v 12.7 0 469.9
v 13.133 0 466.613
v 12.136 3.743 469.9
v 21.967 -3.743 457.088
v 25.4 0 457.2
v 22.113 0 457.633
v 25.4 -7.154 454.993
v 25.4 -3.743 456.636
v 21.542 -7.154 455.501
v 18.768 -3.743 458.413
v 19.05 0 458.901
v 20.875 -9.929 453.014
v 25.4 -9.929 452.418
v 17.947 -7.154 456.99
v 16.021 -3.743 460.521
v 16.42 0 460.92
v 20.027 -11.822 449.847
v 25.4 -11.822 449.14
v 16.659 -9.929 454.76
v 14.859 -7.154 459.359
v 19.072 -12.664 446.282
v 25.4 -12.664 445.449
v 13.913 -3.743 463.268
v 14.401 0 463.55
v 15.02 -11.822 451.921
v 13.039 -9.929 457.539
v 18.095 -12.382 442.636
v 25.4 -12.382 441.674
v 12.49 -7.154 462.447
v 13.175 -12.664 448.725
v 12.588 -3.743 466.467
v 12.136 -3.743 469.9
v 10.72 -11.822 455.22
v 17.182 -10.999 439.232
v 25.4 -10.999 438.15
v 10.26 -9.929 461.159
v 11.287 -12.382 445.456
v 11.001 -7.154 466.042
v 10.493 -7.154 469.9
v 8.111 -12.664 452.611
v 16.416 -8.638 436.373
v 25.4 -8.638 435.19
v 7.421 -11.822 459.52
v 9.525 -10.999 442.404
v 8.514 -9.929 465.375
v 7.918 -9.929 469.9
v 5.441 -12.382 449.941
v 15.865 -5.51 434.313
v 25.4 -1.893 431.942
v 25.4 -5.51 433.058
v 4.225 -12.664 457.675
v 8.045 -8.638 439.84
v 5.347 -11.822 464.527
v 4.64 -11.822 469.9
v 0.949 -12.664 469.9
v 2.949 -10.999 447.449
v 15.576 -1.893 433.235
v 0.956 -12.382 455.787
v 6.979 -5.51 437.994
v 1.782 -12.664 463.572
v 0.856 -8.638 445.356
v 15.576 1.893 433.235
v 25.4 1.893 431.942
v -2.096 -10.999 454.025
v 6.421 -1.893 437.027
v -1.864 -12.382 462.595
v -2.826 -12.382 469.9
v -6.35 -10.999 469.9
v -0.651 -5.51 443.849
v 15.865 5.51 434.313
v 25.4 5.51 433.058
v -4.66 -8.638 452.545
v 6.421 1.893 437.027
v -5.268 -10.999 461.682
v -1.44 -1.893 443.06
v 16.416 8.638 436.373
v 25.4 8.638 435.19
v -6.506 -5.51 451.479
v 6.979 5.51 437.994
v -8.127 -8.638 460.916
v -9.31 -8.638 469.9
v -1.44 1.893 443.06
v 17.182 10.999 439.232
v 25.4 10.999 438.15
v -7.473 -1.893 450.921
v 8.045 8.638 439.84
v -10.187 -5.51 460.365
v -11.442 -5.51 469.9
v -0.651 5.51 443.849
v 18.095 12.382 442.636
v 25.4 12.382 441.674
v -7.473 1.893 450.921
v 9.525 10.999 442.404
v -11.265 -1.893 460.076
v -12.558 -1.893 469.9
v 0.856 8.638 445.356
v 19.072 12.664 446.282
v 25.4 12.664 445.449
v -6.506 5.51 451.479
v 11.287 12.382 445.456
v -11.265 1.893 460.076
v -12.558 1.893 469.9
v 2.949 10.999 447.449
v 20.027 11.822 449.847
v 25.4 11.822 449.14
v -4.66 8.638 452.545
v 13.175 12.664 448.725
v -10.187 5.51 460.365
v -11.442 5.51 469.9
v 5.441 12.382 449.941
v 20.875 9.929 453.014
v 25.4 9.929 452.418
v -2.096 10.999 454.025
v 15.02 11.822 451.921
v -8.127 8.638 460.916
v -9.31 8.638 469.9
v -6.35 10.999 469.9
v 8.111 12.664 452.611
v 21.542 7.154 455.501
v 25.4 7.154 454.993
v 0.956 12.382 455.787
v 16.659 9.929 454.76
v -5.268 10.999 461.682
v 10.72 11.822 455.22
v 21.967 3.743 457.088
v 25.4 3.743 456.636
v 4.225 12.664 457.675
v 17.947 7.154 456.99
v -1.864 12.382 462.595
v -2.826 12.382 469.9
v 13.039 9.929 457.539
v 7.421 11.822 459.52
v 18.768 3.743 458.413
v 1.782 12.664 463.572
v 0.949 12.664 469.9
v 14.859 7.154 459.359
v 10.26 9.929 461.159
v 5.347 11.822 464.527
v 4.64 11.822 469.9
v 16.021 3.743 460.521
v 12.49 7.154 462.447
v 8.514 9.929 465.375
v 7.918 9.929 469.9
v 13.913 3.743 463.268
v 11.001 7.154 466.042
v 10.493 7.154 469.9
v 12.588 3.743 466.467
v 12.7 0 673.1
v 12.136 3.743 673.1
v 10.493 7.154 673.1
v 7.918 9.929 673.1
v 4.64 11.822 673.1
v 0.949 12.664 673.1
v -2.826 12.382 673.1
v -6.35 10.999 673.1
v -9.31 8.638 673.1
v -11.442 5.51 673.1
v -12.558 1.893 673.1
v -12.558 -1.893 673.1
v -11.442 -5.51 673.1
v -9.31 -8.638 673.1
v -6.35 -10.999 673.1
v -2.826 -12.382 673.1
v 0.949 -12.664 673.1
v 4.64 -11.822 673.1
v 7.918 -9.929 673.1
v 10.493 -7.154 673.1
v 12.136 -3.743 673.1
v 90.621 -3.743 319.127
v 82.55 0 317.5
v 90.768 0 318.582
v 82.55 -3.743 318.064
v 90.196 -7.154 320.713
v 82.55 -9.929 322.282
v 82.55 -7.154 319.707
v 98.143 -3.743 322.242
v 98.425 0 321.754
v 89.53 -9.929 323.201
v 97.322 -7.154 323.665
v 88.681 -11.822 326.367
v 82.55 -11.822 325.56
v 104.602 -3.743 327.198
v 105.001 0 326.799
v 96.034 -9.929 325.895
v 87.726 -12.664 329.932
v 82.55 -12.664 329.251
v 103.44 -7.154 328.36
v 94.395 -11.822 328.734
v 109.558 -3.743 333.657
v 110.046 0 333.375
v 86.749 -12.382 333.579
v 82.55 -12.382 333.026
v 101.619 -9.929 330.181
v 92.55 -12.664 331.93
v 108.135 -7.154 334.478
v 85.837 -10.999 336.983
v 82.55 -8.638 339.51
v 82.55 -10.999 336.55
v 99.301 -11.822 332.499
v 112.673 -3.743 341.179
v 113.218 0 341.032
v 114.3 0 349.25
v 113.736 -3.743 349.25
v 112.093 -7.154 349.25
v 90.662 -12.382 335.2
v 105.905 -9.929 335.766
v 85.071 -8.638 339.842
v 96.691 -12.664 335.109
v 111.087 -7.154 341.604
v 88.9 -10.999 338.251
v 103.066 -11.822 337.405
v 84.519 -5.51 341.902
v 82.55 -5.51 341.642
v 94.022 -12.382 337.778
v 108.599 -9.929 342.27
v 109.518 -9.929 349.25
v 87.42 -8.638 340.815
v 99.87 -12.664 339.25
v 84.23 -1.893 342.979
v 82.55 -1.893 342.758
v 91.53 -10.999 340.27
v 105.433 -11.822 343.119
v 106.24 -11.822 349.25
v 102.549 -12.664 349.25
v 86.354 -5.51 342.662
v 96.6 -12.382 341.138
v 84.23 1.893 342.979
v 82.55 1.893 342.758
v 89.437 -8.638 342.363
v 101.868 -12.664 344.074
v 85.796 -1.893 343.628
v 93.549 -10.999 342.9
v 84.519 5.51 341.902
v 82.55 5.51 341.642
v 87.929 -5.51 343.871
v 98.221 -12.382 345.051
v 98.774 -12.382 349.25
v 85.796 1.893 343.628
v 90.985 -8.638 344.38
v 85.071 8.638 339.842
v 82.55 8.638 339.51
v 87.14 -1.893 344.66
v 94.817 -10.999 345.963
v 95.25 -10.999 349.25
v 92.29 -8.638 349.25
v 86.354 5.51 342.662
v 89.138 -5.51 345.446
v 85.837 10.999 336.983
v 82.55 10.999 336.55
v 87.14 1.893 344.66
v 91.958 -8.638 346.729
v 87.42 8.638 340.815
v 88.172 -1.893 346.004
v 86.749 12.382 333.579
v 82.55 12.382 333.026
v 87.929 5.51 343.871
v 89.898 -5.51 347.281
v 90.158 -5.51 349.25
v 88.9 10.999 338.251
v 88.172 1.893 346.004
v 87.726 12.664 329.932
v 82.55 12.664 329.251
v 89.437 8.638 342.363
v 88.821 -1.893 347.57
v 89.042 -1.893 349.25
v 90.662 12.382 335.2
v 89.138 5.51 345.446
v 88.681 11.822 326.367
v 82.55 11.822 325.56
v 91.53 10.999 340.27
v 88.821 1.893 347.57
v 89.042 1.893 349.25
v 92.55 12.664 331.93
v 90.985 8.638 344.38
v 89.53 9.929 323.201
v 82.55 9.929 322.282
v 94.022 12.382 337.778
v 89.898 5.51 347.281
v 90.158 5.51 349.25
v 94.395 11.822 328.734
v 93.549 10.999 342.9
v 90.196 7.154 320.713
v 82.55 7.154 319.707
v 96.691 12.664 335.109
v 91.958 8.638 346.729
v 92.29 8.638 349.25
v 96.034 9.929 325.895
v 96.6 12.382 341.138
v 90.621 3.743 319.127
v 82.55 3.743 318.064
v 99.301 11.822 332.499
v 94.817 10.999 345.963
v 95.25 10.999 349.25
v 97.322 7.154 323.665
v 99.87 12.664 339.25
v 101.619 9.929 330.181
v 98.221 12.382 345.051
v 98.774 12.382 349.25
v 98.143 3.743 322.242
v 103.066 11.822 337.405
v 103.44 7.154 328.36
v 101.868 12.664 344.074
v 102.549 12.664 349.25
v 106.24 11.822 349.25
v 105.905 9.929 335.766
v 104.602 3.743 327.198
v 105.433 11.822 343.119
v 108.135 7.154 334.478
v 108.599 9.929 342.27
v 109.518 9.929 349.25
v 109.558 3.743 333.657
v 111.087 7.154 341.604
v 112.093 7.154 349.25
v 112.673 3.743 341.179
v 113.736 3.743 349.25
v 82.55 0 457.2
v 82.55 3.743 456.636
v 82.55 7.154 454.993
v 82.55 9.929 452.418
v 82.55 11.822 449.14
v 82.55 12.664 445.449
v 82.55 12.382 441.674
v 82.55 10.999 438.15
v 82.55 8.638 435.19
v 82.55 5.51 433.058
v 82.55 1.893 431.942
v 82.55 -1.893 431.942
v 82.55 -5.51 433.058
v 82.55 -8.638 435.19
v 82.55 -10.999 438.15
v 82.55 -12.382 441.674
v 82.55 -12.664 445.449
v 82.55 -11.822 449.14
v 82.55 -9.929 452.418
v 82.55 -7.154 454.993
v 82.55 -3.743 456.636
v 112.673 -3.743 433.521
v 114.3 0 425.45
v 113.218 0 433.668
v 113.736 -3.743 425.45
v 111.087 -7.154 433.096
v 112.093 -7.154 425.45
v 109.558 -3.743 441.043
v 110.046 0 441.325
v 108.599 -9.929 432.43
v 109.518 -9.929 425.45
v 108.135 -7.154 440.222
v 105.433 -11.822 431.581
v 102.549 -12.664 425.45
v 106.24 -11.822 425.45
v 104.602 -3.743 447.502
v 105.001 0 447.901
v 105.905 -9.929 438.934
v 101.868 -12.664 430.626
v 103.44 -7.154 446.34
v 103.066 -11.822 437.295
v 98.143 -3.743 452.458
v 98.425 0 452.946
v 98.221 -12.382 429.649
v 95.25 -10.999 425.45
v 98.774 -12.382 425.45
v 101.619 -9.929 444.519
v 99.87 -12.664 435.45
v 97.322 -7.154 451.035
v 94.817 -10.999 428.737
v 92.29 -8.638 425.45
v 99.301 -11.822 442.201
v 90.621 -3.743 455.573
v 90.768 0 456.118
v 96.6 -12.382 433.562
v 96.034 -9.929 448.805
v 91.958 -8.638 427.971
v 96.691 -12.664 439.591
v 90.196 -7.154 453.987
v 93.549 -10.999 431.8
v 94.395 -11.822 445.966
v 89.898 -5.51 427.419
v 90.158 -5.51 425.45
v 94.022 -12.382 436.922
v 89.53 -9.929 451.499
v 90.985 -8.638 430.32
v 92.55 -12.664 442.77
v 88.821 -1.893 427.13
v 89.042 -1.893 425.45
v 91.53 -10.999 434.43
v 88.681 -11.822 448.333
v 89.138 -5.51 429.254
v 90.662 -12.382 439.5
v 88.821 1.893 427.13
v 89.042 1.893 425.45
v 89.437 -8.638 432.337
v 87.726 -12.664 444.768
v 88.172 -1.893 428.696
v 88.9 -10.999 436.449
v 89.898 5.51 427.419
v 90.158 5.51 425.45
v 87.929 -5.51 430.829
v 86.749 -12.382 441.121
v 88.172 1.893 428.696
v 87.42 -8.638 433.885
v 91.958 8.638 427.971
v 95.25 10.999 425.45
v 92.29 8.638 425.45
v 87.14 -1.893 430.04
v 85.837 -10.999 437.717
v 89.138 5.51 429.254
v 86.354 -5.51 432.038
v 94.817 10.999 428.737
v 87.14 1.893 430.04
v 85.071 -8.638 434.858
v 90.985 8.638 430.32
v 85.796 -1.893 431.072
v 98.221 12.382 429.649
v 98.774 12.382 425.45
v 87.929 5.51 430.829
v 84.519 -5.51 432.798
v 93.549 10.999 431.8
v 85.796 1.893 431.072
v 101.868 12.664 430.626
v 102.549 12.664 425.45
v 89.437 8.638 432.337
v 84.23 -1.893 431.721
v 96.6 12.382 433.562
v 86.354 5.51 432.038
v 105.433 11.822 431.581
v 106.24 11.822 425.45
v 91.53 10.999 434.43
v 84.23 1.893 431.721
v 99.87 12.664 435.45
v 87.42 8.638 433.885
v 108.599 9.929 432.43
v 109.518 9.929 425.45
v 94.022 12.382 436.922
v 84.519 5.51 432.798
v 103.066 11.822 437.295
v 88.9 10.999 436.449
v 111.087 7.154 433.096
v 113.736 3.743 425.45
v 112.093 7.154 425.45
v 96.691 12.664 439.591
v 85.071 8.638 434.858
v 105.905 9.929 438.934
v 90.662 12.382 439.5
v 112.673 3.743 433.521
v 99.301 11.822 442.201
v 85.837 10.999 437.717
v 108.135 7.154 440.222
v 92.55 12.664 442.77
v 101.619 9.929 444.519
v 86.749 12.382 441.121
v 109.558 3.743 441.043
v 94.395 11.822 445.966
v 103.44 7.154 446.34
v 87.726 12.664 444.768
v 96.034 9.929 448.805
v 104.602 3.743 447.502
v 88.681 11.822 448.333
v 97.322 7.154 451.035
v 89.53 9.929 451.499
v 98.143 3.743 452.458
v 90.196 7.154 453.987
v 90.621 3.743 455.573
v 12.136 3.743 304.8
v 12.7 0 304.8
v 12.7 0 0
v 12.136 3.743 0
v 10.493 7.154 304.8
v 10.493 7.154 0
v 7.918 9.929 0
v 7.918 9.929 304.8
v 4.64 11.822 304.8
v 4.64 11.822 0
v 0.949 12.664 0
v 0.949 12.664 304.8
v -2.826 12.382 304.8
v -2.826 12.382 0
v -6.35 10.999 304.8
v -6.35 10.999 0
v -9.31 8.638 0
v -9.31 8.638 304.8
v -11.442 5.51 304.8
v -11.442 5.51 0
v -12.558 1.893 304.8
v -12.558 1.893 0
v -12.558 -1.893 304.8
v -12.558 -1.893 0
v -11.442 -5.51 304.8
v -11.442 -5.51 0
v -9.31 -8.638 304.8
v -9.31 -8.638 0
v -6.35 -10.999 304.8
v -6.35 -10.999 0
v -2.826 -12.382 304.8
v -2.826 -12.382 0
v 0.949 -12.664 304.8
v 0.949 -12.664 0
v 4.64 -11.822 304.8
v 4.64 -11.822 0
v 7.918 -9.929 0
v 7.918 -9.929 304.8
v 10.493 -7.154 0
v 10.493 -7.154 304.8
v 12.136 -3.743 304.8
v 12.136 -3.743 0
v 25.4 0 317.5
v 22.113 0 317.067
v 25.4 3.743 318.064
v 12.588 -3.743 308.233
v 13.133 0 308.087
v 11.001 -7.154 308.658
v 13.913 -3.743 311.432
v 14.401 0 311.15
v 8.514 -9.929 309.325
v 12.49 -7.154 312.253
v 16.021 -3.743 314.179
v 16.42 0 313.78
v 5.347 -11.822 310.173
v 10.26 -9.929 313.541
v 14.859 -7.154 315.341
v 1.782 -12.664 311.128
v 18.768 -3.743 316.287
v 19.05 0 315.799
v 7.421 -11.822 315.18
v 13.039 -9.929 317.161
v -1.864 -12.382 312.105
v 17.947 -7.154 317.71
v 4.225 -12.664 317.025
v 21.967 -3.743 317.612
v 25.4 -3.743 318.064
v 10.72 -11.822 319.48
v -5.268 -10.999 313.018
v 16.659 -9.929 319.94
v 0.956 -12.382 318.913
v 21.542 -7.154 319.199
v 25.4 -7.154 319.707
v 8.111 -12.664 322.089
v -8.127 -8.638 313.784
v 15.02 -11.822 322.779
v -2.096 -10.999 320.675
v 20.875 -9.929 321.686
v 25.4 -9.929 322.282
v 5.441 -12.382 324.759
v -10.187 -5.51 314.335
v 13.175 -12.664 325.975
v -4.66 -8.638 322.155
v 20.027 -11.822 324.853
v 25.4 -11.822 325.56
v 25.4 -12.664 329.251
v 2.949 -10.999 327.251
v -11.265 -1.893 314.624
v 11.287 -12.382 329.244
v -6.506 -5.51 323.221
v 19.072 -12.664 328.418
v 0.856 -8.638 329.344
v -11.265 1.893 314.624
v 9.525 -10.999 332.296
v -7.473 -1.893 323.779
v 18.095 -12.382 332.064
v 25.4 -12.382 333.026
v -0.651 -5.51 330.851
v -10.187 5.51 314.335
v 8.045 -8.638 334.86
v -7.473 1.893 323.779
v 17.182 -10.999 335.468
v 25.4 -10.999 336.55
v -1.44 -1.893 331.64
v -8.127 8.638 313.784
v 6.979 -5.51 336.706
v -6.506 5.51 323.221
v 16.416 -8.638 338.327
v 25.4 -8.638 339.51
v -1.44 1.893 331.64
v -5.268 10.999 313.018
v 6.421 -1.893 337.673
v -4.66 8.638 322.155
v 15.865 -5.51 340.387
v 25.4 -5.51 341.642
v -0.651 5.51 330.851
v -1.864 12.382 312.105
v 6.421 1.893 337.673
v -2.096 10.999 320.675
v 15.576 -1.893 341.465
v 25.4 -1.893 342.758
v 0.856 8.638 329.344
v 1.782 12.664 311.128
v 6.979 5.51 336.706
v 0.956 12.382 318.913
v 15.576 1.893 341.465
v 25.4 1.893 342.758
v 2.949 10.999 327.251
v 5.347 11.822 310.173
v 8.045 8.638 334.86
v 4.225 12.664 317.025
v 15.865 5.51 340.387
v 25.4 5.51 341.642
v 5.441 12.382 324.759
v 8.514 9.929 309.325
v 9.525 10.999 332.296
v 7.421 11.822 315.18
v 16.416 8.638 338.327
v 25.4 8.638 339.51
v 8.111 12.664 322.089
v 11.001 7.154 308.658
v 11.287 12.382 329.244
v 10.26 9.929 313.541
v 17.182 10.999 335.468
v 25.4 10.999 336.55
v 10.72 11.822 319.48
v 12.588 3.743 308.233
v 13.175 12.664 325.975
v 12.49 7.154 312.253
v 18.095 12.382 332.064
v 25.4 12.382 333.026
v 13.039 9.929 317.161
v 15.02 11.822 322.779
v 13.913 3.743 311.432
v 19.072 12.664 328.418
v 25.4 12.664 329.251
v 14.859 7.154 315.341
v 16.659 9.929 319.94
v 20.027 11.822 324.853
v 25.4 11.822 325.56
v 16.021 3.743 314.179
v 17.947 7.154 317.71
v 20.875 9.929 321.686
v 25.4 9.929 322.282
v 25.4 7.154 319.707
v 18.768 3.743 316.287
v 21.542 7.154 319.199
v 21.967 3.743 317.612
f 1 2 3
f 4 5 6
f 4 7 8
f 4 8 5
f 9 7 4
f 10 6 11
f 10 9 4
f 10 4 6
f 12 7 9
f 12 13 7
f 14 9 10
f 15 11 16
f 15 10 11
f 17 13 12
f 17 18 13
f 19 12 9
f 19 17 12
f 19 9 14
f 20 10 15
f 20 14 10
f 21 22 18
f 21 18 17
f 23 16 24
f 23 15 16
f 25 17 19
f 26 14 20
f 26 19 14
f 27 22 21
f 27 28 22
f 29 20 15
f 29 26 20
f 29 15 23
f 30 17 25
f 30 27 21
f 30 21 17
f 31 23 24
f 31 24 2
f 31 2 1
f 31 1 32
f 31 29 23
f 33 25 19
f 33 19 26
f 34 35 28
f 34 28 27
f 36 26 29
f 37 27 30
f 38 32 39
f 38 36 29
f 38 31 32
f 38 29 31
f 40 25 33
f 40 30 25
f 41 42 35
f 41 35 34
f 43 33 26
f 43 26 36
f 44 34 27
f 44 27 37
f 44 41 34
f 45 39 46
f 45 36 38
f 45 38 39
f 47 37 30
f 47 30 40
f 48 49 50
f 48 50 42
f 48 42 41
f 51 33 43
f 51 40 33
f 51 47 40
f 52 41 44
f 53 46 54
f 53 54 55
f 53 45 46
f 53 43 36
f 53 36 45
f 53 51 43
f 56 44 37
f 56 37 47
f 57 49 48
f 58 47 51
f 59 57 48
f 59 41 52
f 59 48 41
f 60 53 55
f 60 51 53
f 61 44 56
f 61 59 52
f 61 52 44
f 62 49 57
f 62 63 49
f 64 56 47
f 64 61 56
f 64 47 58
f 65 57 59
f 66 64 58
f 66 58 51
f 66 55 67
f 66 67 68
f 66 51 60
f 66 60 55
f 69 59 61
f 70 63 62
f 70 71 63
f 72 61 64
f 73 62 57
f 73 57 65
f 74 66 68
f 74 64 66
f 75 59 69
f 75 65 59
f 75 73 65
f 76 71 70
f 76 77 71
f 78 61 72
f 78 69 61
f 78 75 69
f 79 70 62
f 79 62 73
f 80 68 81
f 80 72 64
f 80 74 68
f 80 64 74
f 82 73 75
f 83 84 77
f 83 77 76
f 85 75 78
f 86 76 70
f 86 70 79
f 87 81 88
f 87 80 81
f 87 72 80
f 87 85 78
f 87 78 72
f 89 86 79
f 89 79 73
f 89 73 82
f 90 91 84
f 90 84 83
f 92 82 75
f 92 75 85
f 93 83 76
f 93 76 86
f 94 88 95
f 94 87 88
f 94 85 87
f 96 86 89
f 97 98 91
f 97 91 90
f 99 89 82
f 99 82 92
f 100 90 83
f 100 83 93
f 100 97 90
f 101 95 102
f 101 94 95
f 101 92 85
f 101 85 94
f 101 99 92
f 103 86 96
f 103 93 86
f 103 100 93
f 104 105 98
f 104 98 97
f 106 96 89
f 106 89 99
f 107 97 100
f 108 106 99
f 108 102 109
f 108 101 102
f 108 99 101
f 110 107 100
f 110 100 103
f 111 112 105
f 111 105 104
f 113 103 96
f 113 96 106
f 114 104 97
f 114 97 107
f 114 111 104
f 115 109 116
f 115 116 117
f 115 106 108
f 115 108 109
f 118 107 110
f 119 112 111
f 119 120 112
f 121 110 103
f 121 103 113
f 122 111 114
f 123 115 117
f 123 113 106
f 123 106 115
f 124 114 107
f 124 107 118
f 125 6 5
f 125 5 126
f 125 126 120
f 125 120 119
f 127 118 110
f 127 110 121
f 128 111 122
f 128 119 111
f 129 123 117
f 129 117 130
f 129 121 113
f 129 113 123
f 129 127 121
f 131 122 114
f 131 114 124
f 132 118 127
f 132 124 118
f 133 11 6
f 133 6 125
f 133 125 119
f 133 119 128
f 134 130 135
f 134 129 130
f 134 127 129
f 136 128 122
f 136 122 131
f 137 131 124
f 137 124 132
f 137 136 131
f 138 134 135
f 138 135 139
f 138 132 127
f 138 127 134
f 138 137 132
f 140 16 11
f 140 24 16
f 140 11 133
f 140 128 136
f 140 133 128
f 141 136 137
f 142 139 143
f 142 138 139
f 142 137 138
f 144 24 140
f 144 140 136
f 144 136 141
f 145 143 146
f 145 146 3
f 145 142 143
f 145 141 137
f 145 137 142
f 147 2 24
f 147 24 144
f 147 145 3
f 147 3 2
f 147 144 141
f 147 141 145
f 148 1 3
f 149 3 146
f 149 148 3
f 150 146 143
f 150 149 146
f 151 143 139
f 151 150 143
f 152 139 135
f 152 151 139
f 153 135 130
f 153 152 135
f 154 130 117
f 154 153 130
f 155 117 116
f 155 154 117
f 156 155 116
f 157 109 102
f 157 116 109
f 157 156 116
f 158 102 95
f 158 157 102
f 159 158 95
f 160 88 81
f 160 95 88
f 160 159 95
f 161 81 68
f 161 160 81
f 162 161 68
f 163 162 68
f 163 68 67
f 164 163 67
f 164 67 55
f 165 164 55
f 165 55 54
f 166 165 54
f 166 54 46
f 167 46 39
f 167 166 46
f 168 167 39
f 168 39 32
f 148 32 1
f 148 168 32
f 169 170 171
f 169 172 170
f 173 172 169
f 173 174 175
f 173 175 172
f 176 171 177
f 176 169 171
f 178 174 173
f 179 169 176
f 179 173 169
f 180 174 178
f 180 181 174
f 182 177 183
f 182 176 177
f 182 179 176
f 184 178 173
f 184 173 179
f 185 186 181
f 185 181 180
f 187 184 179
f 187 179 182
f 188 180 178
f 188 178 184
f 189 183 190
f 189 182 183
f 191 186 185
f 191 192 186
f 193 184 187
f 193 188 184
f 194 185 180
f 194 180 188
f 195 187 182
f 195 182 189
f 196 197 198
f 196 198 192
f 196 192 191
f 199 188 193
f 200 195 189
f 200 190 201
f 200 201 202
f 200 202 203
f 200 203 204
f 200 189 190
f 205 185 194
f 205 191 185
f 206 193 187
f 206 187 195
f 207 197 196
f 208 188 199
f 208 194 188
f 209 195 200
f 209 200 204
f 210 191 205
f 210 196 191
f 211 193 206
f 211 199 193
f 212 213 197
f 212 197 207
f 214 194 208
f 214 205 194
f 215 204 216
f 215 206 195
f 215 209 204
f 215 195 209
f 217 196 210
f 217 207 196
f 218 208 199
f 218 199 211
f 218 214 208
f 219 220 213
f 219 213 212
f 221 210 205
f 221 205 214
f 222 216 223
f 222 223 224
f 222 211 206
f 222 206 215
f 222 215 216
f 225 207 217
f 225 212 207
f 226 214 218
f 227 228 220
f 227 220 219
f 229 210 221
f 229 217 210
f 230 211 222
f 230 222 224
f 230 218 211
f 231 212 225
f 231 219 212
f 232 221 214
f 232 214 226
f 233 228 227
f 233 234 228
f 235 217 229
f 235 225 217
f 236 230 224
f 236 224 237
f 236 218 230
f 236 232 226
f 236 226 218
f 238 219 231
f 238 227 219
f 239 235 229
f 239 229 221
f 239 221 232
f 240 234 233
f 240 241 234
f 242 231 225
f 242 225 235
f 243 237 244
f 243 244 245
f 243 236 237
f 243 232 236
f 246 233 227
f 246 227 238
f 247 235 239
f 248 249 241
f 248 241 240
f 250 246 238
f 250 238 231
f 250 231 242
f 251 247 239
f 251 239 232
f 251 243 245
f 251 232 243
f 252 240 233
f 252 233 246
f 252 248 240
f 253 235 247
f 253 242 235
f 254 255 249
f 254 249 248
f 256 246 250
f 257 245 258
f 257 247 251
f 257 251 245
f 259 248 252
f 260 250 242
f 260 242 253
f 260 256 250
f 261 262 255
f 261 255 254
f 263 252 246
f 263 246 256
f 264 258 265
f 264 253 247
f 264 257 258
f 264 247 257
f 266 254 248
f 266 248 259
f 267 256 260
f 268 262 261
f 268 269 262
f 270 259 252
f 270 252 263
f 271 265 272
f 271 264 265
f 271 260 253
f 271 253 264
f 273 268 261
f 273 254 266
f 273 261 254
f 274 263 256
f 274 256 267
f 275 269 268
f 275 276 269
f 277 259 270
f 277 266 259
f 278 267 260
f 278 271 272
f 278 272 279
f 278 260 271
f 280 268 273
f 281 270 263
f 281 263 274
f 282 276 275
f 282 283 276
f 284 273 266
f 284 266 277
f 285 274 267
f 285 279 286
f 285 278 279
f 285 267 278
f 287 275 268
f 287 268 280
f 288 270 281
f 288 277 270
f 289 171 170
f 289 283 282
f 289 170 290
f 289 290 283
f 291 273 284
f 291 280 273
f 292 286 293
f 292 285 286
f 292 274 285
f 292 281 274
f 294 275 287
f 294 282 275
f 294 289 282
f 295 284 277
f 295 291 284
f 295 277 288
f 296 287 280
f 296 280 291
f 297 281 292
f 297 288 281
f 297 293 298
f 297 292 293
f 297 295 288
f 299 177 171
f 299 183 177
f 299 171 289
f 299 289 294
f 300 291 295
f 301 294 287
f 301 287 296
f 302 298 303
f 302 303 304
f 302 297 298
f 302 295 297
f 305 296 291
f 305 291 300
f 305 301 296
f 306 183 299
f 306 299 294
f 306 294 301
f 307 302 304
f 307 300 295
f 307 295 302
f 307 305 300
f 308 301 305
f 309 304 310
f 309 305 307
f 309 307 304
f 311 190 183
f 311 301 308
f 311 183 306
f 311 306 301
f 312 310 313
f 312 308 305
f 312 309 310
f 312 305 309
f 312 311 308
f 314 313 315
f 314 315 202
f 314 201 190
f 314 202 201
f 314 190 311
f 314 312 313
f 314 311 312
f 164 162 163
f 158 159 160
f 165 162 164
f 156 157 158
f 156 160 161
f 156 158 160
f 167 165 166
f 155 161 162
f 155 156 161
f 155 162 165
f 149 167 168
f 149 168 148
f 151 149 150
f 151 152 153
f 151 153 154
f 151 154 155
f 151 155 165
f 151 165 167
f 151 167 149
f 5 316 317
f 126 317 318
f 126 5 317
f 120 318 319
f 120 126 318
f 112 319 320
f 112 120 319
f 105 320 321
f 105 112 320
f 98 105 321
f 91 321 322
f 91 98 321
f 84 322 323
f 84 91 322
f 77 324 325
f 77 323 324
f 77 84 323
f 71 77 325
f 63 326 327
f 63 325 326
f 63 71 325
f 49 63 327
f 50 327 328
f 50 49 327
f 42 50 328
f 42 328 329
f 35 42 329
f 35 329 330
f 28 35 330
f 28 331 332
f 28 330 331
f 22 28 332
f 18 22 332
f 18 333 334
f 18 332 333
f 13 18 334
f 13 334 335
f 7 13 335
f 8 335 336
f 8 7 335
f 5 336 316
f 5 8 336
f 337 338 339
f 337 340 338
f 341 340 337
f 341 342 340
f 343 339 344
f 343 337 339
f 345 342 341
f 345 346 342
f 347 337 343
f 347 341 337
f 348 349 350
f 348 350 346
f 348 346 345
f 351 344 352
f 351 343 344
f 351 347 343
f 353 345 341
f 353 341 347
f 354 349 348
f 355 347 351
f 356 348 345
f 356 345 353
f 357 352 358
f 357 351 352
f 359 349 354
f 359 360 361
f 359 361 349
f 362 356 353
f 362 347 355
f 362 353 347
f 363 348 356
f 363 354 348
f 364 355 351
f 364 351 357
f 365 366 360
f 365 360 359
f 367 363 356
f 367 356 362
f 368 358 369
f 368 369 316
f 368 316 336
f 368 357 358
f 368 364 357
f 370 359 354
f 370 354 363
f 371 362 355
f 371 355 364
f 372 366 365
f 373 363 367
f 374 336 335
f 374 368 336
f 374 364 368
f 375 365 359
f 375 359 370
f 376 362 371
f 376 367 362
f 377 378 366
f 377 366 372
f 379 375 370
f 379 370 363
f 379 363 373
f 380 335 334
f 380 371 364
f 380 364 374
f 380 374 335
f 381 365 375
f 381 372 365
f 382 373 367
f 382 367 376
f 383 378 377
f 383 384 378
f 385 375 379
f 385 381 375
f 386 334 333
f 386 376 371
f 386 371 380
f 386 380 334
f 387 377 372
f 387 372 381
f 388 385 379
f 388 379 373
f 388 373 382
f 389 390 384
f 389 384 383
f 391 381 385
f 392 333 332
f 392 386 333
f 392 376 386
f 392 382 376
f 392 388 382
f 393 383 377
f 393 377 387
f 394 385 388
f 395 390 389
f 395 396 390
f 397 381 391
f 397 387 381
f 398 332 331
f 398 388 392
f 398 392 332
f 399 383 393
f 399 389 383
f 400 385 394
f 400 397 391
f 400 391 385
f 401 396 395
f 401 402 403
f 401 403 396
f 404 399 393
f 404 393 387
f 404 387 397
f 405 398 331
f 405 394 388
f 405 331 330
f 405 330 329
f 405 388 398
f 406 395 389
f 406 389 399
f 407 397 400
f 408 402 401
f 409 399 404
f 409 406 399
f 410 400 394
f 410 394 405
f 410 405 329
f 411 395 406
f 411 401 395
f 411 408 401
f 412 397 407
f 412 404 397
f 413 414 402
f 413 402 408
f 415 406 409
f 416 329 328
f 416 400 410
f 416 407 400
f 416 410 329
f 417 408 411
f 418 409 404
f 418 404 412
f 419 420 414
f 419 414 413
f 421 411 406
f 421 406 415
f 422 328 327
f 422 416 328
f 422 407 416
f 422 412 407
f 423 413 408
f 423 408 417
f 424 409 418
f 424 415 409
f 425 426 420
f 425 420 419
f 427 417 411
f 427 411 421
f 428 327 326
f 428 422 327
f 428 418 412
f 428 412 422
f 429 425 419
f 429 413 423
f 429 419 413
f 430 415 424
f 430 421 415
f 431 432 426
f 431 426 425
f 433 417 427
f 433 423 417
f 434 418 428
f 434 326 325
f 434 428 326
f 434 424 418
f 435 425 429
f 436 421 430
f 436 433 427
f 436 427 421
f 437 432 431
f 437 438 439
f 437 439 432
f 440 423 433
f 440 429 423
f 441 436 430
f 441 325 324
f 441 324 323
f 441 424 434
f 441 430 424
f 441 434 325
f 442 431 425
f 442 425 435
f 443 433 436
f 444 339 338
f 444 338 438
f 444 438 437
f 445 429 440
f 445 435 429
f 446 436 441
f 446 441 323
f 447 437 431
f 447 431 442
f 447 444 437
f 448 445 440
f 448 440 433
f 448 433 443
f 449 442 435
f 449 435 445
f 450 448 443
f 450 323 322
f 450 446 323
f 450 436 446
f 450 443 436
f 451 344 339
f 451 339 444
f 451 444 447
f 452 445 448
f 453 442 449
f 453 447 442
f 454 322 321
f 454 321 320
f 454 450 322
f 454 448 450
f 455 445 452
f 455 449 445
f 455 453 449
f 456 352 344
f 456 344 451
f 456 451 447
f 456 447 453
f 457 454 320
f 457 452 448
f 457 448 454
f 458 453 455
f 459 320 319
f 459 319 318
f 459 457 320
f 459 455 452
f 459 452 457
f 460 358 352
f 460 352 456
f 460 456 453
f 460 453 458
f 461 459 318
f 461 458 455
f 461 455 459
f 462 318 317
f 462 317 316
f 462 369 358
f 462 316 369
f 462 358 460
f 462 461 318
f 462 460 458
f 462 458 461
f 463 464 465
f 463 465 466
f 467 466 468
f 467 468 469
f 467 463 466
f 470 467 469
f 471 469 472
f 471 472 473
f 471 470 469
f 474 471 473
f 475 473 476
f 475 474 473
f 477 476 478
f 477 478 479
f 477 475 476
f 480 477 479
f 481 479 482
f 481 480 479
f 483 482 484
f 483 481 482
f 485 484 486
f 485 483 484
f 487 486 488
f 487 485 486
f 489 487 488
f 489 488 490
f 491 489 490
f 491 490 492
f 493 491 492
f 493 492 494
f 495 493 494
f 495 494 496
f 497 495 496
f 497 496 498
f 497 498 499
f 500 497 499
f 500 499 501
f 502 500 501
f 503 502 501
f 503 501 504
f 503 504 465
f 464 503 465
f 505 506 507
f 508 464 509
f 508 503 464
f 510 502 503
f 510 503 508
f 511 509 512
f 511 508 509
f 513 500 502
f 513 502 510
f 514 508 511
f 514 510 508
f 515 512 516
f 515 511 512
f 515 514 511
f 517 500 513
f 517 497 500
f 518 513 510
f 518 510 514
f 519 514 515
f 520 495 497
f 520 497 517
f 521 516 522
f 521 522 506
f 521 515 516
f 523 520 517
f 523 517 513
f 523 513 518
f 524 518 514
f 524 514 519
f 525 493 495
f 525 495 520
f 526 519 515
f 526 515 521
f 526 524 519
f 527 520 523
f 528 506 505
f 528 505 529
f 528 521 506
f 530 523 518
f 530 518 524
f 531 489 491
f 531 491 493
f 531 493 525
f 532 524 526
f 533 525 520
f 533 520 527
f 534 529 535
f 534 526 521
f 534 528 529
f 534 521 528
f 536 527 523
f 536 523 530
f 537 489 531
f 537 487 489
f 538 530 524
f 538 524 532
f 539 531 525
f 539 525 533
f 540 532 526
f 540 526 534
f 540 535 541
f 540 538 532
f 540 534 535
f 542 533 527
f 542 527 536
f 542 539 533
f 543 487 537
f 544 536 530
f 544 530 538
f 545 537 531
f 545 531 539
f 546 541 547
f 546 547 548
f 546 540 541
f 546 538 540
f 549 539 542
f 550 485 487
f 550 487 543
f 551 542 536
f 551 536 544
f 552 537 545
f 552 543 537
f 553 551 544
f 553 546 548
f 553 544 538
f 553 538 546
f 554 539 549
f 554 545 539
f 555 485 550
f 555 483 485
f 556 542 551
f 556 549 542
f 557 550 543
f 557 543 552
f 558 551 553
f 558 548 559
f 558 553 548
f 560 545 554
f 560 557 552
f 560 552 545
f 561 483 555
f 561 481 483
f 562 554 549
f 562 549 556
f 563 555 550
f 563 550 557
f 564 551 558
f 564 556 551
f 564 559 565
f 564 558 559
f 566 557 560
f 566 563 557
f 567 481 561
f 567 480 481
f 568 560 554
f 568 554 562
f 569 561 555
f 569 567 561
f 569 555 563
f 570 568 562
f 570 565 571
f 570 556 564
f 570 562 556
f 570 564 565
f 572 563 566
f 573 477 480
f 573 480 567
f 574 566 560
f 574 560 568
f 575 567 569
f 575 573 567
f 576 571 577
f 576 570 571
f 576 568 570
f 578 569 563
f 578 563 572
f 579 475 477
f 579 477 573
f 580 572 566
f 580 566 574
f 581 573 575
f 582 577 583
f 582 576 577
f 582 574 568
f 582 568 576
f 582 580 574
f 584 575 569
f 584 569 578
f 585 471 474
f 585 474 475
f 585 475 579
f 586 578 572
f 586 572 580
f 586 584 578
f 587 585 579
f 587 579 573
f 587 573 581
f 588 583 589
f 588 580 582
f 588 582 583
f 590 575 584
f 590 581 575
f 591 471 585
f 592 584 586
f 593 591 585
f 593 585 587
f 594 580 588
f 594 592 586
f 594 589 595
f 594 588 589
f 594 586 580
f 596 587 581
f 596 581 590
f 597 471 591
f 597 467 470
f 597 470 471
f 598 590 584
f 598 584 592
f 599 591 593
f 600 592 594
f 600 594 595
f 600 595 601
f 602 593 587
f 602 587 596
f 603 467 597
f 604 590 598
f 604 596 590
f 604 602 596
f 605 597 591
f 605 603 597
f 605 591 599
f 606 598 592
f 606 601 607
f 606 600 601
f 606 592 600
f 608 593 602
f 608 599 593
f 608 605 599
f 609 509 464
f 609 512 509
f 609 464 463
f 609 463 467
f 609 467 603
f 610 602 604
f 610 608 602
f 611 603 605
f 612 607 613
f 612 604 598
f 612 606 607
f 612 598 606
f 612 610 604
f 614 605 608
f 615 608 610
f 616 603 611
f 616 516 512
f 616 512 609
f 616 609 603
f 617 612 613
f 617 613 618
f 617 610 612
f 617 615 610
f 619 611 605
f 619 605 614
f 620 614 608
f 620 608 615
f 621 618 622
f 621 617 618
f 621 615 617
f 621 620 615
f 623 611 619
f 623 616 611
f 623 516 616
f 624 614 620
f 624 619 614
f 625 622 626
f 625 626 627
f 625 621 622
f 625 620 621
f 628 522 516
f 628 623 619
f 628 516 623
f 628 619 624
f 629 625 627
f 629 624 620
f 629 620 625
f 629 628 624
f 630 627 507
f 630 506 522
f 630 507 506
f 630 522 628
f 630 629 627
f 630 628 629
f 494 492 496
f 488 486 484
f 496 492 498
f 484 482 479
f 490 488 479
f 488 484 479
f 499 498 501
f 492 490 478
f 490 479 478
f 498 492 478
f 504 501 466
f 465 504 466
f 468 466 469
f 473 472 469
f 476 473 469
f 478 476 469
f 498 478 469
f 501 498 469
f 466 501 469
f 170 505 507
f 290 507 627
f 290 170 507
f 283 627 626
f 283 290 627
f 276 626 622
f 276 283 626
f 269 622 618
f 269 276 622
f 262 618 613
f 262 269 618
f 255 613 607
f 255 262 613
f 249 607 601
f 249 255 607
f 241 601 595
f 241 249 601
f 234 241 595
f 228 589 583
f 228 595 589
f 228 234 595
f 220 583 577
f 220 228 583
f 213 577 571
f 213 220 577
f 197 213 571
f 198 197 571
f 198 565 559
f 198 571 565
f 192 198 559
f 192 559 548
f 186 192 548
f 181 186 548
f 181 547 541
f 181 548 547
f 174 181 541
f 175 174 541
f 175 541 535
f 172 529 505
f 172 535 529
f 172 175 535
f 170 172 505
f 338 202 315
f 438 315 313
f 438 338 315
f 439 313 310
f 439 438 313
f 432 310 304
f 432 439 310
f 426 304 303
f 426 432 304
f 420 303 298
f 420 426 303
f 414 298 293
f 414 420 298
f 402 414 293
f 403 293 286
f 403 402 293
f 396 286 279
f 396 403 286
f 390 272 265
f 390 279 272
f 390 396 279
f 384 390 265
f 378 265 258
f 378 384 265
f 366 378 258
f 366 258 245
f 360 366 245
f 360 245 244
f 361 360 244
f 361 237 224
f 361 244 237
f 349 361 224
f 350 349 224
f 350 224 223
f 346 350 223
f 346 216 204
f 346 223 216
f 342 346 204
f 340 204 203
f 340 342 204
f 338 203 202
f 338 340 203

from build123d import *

# Parameters (mm, degrees)
F1_R = 12.7


with BuildPart() as f2:
    # F2: sweep along a path in F0
    with BuildLine(Plane.XZ) as f2_path:
        Line((0, 0), (0, 304.8))
        ThreePointArc((0, 304.8), (7.4394877579, 322.7605122421), (25.4, 330.2))
        Line((25.4, 330.2), (82.55, 330.2))
        ThreePointArc((82.55, 330.2), (96.0203841816, 335.7796158184), (101.6, 349.25))
        Line((101.6, 349.25), (101.6, 425.45))
        ThreePointArc((101.6, 425.45), (96.0203841816, 438.9203841816), (82.55, 444.5))
        Line((82.55, 444.5), (25.4, 444.5))
        ThreePointArc((25.4, 444.5), (7.4394877579, 451.9394877579), (0, 469.9))
        Line((0, 469.9), (0, 673.1))
    # F1 (on Top) → F2 (sweep)
    with BuildSketch(Plane.XY):
        Circle(F1_R)
    sweep(path=f2_path.line)


solid = f2.part
